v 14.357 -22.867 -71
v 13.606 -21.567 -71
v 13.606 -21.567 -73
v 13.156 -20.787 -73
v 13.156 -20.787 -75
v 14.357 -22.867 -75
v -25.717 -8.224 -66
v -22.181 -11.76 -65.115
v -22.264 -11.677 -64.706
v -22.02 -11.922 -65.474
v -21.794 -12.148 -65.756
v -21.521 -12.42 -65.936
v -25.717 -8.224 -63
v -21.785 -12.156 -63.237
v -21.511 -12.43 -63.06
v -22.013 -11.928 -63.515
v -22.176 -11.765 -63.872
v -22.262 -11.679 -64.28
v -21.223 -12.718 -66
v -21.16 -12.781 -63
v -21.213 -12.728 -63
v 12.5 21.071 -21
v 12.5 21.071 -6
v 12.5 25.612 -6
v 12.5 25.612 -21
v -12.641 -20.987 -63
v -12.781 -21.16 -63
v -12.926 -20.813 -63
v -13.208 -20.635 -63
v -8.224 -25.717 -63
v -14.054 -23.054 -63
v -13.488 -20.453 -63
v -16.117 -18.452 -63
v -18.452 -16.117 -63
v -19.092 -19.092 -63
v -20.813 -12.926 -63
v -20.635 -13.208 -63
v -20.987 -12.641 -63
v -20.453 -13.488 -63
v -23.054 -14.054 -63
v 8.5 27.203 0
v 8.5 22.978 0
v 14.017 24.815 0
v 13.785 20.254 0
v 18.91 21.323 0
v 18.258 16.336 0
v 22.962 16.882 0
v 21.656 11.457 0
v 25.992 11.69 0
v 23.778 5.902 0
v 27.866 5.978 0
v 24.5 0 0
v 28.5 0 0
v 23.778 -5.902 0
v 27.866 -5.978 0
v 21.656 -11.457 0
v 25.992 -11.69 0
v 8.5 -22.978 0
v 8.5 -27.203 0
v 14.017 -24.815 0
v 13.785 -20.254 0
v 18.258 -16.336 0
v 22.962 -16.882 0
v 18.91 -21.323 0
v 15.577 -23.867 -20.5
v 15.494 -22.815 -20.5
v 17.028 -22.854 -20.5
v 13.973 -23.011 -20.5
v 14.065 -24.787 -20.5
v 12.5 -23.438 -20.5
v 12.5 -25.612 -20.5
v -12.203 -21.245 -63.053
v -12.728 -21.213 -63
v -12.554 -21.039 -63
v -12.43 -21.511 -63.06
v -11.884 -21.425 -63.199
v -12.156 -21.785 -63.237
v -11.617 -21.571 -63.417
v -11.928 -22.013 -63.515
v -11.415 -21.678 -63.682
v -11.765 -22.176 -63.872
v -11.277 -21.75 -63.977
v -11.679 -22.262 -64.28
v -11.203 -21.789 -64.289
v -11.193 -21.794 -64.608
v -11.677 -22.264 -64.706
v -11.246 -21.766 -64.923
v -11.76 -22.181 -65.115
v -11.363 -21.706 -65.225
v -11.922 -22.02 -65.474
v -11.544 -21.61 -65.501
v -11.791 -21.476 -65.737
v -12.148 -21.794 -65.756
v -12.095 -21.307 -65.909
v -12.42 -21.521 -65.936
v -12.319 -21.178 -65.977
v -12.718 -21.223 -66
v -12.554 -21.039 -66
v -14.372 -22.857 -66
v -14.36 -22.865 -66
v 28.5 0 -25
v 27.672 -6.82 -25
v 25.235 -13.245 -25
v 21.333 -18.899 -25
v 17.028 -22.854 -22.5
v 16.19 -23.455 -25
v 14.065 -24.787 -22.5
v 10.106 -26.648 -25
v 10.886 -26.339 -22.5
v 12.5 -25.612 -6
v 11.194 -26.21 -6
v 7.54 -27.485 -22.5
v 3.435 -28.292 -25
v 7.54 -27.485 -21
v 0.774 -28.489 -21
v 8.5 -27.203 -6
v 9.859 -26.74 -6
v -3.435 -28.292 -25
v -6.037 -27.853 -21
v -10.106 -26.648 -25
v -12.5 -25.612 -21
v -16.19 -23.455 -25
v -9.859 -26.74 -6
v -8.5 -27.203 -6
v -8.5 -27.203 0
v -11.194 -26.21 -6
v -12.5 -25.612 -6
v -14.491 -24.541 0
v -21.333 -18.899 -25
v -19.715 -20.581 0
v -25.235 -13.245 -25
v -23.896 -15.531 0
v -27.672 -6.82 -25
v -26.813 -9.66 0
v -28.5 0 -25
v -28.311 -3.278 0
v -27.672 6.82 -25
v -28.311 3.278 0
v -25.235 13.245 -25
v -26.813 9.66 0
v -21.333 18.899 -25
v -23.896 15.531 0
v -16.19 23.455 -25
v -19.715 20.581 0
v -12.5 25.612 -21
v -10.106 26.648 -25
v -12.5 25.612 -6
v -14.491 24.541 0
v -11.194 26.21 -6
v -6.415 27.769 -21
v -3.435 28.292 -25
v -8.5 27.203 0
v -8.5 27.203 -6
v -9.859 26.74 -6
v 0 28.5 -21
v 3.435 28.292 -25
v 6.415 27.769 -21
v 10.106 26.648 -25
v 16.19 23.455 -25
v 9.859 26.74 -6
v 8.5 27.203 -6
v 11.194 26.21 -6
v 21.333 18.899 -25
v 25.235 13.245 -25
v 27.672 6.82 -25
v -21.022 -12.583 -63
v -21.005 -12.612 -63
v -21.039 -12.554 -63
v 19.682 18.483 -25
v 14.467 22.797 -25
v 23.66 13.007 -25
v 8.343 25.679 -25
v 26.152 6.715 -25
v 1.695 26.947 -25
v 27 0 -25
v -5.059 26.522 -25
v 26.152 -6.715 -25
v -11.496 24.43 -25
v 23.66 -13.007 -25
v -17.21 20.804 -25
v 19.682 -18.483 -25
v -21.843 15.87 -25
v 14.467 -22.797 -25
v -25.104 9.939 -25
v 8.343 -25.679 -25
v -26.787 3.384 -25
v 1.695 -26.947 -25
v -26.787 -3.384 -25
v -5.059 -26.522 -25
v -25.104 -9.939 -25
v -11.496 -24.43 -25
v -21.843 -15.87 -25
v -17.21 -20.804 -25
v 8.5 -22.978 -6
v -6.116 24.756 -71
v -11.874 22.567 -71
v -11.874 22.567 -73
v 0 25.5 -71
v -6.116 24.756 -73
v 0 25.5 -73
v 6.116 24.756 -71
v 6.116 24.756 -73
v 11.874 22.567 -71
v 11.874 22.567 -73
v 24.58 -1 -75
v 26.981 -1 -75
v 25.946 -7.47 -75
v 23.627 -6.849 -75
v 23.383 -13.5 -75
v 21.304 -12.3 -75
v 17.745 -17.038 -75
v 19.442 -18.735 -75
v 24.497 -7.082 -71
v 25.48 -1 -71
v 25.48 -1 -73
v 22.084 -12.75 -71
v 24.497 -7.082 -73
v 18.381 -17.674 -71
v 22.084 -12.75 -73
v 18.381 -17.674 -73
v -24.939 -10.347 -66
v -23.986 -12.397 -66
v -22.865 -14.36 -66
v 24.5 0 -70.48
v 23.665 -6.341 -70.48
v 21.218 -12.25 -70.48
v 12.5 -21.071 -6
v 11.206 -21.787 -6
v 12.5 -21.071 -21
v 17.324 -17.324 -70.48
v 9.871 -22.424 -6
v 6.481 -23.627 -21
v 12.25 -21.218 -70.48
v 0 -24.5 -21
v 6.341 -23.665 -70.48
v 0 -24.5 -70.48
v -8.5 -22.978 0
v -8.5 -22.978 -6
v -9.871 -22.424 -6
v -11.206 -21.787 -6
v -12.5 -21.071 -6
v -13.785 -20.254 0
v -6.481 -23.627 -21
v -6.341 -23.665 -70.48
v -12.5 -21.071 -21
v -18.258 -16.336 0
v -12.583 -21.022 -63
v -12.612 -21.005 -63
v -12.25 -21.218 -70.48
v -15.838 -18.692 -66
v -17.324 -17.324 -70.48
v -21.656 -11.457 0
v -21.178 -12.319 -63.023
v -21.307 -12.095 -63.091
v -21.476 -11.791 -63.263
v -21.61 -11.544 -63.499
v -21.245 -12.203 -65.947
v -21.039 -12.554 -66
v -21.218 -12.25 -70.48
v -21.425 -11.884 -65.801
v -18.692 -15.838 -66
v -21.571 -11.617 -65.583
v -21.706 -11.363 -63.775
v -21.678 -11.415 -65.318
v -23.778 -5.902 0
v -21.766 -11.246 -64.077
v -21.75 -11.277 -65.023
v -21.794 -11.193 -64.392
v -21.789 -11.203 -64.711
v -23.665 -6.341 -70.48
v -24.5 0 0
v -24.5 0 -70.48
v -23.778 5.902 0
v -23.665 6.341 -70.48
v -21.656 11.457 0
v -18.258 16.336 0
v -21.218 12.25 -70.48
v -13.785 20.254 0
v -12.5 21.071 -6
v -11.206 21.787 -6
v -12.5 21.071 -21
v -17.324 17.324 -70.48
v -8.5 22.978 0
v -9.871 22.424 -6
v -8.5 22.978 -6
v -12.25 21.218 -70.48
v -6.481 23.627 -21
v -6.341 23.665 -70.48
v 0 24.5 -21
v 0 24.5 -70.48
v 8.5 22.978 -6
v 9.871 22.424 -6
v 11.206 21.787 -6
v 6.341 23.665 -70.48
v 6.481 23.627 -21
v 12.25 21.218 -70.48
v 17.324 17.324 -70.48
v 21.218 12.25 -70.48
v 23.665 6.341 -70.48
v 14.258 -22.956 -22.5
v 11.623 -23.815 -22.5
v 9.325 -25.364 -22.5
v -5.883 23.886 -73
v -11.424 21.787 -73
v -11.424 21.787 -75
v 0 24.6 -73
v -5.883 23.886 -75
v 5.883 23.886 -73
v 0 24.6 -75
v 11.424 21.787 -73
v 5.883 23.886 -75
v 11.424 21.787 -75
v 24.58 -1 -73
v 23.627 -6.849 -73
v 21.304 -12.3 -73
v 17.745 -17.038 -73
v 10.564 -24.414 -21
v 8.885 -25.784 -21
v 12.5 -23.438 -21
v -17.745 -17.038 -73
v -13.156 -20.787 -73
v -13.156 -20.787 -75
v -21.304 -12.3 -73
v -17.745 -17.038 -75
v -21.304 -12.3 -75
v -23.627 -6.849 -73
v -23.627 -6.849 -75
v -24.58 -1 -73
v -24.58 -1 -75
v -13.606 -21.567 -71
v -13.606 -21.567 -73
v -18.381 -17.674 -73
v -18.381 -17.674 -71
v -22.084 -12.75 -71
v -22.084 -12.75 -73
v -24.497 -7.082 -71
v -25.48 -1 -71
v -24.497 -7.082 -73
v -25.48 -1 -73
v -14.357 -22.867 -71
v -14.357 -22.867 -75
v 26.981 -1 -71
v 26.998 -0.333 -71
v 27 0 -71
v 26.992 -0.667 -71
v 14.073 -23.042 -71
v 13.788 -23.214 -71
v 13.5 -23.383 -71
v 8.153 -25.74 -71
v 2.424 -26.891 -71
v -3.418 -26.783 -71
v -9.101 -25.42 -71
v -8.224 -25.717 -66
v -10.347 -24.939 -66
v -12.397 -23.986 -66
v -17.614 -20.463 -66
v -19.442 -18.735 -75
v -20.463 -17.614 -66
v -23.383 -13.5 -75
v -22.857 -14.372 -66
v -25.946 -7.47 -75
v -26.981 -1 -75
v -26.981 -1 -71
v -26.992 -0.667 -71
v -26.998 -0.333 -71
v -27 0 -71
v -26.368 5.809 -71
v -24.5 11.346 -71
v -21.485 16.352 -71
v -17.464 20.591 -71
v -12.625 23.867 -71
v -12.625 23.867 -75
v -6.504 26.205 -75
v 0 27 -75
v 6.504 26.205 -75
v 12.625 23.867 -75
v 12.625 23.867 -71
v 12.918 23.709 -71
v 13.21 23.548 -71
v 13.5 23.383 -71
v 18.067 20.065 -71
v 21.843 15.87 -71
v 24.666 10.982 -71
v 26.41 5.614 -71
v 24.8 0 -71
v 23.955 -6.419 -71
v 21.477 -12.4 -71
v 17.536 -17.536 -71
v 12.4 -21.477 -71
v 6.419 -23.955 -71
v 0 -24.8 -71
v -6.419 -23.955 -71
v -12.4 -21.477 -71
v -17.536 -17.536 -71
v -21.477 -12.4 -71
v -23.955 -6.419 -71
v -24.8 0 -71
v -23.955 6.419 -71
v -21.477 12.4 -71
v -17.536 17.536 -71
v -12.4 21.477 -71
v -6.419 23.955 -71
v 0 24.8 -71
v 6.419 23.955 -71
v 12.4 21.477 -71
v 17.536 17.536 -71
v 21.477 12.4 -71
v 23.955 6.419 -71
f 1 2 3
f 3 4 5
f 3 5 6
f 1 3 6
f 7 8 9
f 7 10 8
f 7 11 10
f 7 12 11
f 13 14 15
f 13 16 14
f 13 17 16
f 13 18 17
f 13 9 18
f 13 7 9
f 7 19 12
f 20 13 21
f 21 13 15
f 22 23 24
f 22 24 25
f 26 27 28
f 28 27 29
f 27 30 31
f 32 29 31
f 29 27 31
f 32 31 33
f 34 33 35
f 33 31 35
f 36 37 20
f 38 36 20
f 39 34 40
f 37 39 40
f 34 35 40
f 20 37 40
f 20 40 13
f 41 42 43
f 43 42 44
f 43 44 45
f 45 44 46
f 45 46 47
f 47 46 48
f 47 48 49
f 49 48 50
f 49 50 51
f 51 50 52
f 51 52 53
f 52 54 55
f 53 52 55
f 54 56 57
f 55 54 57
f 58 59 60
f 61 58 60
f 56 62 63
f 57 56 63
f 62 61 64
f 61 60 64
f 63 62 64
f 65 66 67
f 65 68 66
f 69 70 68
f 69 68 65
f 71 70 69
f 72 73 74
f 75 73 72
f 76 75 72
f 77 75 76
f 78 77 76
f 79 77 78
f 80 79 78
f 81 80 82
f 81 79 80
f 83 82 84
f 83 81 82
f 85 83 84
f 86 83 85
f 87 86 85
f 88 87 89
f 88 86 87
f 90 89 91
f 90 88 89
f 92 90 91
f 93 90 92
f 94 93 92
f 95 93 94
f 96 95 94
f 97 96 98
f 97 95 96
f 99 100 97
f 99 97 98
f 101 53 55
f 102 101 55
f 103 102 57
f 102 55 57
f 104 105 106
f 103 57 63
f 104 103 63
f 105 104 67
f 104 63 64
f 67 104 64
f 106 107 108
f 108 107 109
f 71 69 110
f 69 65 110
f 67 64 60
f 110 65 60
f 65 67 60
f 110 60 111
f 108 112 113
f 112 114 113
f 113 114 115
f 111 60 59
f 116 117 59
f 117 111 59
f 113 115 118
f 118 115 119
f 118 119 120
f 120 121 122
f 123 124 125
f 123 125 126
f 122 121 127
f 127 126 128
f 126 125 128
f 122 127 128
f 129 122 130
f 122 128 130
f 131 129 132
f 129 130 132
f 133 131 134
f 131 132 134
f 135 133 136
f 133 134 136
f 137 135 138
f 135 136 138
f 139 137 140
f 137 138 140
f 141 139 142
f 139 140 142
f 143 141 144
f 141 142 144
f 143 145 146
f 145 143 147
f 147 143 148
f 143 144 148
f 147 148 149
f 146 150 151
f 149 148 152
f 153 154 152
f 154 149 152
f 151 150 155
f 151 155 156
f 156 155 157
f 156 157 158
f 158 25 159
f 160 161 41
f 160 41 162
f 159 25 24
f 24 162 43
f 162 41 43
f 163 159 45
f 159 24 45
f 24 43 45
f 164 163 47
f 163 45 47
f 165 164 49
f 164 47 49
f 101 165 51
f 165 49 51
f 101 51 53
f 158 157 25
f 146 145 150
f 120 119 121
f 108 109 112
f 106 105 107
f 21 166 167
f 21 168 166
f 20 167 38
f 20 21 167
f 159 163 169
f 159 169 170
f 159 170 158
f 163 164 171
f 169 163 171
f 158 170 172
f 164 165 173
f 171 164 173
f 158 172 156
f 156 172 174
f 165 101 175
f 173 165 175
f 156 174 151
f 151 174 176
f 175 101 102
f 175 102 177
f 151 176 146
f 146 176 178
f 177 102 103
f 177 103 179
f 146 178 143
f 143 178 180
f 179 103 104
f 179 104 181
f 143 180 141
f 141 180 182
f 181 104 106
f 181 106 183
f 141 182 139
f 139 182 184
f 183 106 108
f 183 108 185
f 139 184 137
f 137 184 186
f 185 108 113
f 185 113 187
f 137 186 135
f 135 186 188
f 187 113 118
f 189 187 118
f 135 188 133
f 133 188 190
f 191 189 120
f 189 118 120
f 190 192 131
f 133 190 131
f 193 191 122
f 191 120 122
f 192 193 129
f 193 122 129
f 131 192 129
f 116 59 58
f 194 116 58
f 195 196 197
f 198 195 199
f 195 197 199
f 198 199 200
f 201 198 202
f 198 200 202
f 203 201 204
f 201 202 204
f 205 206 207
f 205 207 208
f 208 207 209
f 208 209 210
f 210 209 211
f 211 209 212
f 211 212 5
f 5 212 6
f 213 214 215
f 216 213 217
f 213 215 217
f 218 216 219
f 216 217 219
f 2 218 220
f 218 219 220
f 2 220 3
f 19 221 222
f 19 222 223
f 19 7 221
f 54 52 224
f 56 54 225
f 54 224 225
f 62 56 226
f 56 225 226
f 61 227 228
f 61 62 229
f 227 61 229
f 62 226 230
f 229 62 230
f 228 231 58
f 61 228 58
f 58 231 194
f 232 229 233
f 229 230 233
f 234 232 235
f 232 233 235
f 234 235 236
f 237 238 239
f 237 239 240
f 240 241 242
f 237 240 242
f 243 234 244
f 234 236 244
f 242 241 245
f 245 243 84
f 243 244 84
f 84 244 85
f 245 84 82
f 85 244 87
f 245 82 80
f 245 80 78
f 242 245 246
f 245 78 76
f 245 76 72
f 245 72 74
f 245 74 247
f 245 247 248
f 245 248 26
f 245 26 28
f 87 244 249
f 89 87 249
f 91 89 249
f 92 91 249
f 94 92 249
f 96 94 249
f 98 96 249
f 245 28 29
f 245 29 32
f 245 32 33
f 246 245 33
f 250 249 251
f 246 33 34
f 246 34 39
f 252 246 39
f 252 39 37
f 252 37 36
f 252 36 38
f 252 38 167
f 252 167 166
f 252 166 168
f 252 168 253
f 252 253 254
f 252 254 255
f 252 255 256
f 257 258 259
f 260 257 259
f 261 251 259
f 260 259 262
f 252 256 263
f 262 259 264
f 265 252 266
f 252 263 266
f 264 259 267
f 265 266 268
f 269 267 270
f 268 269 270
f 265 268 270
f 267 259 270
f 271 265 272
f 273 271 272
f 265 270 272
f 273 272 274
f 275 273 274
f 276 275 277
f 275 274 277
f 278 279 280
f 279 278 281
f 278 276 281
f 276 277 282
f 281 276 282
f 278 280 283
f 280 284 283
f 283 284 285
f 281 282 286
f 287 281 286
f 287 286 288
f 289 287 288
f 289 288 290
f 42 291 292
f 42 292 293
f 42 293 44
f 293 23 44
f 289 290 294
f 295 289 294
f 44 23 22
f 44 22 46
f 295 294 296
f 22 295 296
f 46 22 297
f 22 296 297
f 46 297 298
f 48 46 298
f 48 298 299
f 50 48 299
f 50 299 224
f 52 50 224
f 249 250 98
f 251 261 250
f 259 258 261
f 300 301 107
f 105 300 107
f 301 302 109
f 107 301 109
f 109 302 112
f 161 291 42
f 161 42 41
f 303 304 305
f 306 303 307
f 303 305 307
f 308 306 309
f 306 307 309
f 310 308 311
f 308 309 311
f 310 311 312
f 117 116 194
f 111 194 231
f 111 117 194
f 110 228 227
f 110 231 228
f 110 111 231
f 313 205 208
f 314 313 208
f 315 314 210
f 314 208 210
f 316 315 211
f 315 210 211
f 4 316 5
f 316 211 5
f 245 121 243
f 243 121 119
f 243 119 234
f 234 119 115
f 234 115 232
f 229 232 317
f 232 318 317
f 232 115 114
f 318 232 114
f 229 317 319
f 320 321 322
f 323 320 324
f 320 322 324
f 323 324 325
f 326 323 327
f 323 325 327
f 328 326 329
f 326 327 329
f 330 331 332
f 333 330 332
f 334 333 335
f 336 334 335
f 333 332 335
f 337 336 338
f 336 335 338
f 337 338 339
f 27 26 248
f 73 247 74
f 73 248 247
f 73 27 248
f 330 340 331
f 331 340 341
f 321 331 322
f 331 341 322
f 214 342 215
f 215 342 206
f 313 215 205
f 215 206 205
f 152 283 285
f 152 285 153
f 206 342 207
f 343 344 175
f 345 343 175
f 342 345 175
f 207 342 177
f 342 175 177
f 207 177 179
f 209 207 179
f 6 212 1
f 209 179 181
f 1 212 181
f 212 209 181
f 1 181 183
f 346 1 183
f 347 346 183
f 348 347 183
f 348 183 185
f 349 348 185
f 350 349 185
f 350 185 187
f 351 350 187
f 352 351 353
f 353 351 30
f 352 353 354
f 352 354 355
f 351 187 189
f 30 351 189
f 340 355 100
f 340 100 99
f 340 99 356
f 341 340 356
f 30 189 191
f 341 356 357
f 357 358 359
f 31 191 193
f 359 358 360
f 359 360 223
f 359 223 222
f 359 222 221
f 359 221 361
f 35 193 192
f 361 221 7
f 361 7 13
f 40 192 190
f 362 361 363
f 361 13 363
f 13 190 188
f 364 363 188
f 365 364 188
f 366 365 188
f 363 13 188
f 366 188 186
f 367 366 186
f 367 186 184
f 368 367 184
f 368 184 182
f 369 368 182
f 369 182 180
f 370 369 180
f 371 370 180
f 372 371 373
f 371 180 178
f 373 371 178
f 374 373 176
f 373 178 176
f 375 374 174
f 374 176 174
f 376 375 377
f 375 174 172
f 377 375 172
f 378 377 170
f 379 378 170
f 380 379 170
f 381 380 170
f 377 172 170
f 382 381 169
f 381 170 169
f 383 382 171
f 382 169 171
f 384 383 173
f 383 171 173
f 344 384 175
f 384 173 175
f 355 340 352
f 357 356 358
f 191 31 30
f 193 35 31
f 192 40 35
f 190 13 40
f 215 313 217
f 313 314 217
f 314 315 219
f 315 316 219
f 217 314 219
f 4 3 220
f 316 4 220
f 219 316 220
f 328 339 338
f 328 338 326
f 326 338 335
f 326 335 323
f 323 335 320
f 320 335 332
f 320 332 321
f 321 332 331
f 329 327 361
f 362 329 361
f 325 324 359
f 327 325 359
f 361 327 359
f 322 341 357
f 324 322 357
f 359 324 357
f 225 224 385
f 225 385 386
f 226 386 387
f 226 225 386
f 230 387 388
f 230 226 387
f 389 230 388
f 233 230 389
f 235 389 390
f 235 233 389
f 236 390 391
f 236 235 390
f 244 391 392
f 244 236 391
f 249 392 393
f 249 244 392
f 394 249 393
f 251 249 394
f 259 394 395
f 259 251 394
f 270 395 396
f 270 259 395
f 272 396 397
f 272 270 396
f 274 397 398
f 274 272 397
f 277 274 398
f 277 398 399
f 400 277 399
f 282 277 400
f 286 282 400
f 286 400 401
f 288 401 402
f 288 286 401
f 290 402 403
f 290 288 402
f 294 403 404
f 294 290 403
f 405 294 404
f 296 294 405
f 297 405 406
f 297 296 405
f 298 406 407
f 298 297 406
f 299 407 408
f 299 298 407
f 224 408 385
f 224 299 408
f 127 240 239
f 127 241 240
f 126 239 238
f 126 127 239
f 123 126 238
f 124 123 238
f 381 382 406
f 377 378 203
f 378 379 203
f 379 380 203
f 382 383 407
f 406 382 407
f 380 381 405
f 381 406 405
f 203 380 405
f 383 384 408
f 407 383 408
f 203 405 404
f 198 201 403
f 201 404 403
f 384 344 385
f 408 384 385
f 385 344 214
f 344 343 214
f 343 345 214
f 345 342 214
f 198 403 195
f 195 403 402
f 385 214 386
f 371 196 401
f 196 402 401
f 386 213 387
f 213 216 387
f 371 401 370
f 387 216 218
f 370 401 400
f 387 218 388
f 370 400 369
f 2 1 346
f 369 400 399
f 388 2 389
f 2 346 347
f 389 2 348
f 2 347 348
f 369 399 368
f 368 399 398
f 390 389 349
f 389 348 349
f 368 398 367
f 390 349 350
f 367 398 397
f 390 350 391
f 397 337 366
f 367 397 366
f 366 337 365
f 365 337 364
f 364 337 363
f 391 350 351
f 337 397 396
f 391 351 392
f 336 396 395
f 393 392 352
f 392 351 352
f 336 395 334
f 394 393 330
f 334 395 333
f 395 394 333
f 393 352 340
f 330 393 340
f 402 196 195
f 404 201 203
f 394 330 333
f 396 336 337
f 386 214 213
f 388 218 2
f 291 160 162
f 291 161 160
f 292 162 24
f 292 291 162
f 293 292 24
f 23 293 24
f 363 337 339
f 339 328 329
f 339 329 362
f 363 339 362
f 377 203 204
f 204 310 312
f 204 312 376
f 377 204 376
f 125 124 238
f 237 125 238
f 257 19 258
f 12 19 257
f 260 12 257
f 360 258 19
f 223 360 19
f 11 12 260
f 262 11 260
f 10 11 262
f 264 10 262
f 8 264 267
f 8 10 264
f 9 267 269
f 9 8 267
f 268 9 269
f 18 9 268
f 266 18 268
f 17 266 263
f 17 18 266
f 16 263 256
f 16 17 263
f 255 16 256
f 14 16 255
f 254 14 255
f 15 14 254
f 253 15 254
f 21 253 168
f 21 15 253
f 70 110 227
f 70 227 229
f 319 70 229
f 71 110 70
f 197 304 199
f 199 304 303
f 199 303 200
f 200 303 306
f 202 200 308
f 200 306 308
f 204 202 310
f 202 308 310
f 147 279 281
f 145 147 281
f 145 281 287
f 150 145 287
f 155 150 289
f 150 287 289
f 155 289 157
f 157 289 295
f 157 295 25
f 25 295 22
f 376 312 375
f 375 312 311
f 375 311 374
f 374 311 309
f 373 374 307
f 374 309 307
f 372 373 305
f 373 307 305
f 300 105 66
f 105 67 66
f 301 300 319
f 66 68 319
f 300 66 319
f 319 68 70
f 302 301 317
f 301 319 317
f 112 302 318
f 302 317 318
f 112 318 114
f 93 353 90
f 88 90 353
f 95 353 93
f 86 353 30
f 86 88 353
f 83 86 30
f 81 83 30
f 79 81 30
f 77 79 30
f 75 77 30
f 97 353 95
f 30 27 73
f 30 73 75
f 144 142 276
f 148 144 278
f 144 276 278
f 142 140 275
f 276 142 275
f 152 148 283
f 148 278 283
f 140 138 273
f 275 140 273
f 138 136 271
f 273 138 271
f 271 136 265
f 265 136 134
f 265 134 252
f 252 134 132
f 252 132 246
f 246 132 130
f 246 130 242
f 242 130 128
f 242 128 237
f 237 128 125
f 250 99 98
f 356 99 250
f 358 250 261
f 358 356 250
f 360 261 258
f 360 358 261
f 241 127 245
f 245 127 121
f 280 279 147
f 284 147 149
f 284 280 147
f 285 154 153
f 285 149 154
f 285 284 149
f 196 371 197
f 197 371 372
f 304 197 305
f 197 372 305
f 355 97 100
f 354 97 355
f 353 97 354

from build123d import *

# Parameters (mm, degrees)
CUT_EXTRUDE_4_DEPTH      = 4
PATTERN_CIRCULAR_1_COUNT = 3
CUT_EXTRUDE_7_DEPTH      = 86.143936954
CUT_EXTRUDE_7_DEPTH_BACK = 86.143936954
SKETCH_12_W              = 25
SKETCH_12_H              = 15
CUT_EXTRUDE_START        = -6
SKETCH_13_W              = 17
SKETCH_13_H              = 62.633188826
CUT_EXTRUDE_12_DEPTH     = 6
CHAMFER_2_SIZE           = 0.3
CHAMFER_2_SIZE2          = 0.519615242
SKETCH_14_W              = 2
SKETCH_14_H              = 10
SKETCH_16_W              = 3
SKETCH_16_H              = 60.736072742
CUT_EXTRUDE_14_DEPTH     = 3
CHAMFER_3_SIZE           = 1
CUT_EXTRUDE_13_REACH     = 102.772


with BuildPart() as part:
    # Эскиз1 → Повернуть1 (revolve)
    with BuildSketch(Plane(origin=(0, 0, 0), x_dir=(0, 0, -1), z_dir=(1, 0, 0)), mode=Mode.PRIVATE) as revolve_1_sk:
        Polygon((0, 24.5), (70.999933333, 24.5), (70.999933333, 25.5), (72.999933333, 25.5), (72.999933333, 24.6), (74.999933333, 24.6), (74.999933333, 27), (25, 27), (25, 28.5), (0, 28.5), align=None)
    revolve(revolve_1_sk.sketch.rotate(Axis((0, 0, 0), (0, 0, -1)), 90), axis=Axis((0, 0, 0), (0, 0, -1)))

    # Эскиз9 → Вырез-Вытянуть4 (cut)
    with BuildSketch(Plane(origin=(0, 0, -74.999933333), x_dir=(-1, 0, 0), z_dir=(0, 0, -1))):
        with BuildLine():
            ThreePointArc((24.6, 0), (24.594916073, -0.500103353), (24.579666393, -1))
            Line((24.579666393, -1), (26.981475126, -1))
            ThreePointArc((26.981475126, -1), (26.995368384, -0.500085785), (27, 0))
            ThreePointArc((27, 0), (23.128631913, 13.930771186), (12.624712159, 23.866642891))
            Line((12.624712159, 23.866642891), (11.423807793, 21.786615513))
            ThreePointArc((11.423807793, 21.786615513), (21.049770447, 12.730560245), (24.6, 0))
        make_face()
    cut_extrude_4 = extrude(amount=-CUT_EXTRUDE_4_DEPTH, mode=Mode.SUBTRACT)

    # Круговой массив1: Вырез-Вытянуть4 ×3 about axis
    pattern_circular_1_axis = Axis((0, 0, 0), (0, 0, 1))
    for i in range(1, PATTERN_CIRCULAR_1_COUNT):
        add(cut_extrude_4.rotate(pattern_circular_1_axis, i * 360 / PATTERN_CIRCULAR_1_COUNT), mode=Mode.SUBTRACT)

    # Эскиз12 → Вырез-Вытянуть7 (cut, two sides: drawn at the far end of the back side and taken through both)
    with BuildSketch(Plane(origin=(0, 0, 0), x_dir=(1, 0, 0), z_dir=(0, 1, 0)).offset(-CUT_EXTRUDE_7_DEPTH_BACK)):
        with Locations((0, 13.5)):
            Rectangle(SKETCH_12_W, SKETCH_12_H)
    extrude(amount=CUT_EXTRUDE_7_DEPTH + CUT_EXTRUDE_7_DEPTH_BACK, mode=Mode.SUBTRACT)

    # Эскиз13 → Вырез-Вытянуть12 (cut)
    with BuildSketch(Plane.XY.offset(CUT_EXTRUDE_START)):
        Rectangle(SKETCH_13_W, SKETCH_13_H)
    extrude(amount=CUT_EXTRUDE_12_DEPTH, mode=Mode.SUBTRACT)

    # Фаска2
    chamfer_2_edges = [part.edges().sort_by_distance(p)[0] for p in [
        (-24.5, 0, -70.999933333),
    ]]
    chamfer_2_side = [part.faces().sort_by_distance(p)[0] for p in [
        (0, 24.746856587, -70.999933333),
    ]]
    chamfer(chamfer_2_edges, length=CHAMFER_2_SIZE, length2=CHAMFER_2_SIZE2, reference=chamfer_2_side[0])

    # Эскиз14 → Вырез-Повернуть1 (revolve, cut)
    with BuildSketch(Plane(origin=(0, 0, 0), x_dir=(0, 0, 1), z_dir=(-0.8986841034993474, -0.4385964912280702, 0))):
        with Locations((-21.5, -31.5)):
            Rectangle(SKETCH_14_W, SKETCH_14_H)
    revolve(axis=Axis((16.00877193, -32.801969778, -26.23783224), (0, 0, 1)), mode=Mode.SUBTRACT)

    # Эскиз16 → Вырез-Вытянуть14 (cut)
    with BuildSketch(Plane(origin=(-19.091883092, -19.091883092, 0), x_dir=(0, 0, 1), z_dir=(-0.7071067811865464, -0.7071067811865488, 0))):
        with Locations((-64.499933333, 0.711195231)):
            Rectangle(SKETCH_16_W, SKETCH_16_H)
    extrude(amount=-CUT_EXTRUDE_14_DEPTH, mode=Mode.SUBTRACT)

    # Фаска3
    # the kernel refuses this chamfer: 1 mm, written as the material it takes off along each edge
    with BuildSketch(Plane(origin=(-20.452659818, -13.488465679, -62.999933333), x_dir=(-0.5333586097594283, 0.8458892323439812, 0), z_dir=(0, 0, -1))) as chamfer_3_piece_1:
        with BuildLine():
            Line((1.002291345, 0), (CHAMFER_3_SIZE * 0.975275502088, -CHAMFER_3_SIZE * 0.220992522558))
            Line((CHAMFER_3_SIZE * 0.975275502088, -CHAMFER_3_SIZE * 0.220992522558), (0, 0))
            ThreePointArc((0, 0), (0.503575038, -0.005125864), (1.002291345, 0))
        make_face()
    extrude(amount=3, mode=Mode.SUBTRACT)
    with BuildSketch(Plane(origin=(-13.488465679, -20.452659818, -62.999933333), x_dir=(0.8458892323439845, -0.5333586097594231, 0), z_dir=(0, 0, -1))) as chamfer_3_piece_2:
        with BuildLine():
            Line((1.002291345, 0), (CHAMFER_3_SIZE * 0.975275502088, CHAMFER_3_SIZE * 0.220992522558))
            Line((CHAMFER_3_SIZE * 0.975275502088, CHAMFER_3_SIZE * 0.220992522558), (0, 0))
            ThreePointArc((0, 0), (0.503575038, 0.005125864), (1.002291345, 0))
        make_face()
    extrude(amount=3, mode=Mode.SUBTRACT)

    # Эскиз15 → Вырез-Вытянуть13 (cut, up to next)
    with BuildSketch(Plane(origin=(-19.091883092, -19.091883092, 0), x_dir=(0, 0, 1), z_dir=(-0.7071067811865464, -0.7071067811865488, 0)), mode=Mode.PRIVATE) as cut_extrude_13_sk1:
        with BuildLine():
            Line((-63, 6), (-63, -6))
            ThreePointArc((-63, -6), (-64.5, -7.5), (-66, -6))
            Line((-66, -6), (-66, 6))
            ThreePointArc((-66, 6), (-64.5, 7.5), (-63, 6))
        make_face()
    cut_extrude_13_tool1 = extrude(cut_extrude_13_sk1.sketch, amount=-CUT_EXTRUDE_13_REACH, mode=Mode.PRIVATE) & part.part
    add(cut_extrude_13_tool1.solids().sort_by_distance((-19.091883, -19.091883, -64.5))[0], mode=Mode.SUBTRACT)


solid = part.part
